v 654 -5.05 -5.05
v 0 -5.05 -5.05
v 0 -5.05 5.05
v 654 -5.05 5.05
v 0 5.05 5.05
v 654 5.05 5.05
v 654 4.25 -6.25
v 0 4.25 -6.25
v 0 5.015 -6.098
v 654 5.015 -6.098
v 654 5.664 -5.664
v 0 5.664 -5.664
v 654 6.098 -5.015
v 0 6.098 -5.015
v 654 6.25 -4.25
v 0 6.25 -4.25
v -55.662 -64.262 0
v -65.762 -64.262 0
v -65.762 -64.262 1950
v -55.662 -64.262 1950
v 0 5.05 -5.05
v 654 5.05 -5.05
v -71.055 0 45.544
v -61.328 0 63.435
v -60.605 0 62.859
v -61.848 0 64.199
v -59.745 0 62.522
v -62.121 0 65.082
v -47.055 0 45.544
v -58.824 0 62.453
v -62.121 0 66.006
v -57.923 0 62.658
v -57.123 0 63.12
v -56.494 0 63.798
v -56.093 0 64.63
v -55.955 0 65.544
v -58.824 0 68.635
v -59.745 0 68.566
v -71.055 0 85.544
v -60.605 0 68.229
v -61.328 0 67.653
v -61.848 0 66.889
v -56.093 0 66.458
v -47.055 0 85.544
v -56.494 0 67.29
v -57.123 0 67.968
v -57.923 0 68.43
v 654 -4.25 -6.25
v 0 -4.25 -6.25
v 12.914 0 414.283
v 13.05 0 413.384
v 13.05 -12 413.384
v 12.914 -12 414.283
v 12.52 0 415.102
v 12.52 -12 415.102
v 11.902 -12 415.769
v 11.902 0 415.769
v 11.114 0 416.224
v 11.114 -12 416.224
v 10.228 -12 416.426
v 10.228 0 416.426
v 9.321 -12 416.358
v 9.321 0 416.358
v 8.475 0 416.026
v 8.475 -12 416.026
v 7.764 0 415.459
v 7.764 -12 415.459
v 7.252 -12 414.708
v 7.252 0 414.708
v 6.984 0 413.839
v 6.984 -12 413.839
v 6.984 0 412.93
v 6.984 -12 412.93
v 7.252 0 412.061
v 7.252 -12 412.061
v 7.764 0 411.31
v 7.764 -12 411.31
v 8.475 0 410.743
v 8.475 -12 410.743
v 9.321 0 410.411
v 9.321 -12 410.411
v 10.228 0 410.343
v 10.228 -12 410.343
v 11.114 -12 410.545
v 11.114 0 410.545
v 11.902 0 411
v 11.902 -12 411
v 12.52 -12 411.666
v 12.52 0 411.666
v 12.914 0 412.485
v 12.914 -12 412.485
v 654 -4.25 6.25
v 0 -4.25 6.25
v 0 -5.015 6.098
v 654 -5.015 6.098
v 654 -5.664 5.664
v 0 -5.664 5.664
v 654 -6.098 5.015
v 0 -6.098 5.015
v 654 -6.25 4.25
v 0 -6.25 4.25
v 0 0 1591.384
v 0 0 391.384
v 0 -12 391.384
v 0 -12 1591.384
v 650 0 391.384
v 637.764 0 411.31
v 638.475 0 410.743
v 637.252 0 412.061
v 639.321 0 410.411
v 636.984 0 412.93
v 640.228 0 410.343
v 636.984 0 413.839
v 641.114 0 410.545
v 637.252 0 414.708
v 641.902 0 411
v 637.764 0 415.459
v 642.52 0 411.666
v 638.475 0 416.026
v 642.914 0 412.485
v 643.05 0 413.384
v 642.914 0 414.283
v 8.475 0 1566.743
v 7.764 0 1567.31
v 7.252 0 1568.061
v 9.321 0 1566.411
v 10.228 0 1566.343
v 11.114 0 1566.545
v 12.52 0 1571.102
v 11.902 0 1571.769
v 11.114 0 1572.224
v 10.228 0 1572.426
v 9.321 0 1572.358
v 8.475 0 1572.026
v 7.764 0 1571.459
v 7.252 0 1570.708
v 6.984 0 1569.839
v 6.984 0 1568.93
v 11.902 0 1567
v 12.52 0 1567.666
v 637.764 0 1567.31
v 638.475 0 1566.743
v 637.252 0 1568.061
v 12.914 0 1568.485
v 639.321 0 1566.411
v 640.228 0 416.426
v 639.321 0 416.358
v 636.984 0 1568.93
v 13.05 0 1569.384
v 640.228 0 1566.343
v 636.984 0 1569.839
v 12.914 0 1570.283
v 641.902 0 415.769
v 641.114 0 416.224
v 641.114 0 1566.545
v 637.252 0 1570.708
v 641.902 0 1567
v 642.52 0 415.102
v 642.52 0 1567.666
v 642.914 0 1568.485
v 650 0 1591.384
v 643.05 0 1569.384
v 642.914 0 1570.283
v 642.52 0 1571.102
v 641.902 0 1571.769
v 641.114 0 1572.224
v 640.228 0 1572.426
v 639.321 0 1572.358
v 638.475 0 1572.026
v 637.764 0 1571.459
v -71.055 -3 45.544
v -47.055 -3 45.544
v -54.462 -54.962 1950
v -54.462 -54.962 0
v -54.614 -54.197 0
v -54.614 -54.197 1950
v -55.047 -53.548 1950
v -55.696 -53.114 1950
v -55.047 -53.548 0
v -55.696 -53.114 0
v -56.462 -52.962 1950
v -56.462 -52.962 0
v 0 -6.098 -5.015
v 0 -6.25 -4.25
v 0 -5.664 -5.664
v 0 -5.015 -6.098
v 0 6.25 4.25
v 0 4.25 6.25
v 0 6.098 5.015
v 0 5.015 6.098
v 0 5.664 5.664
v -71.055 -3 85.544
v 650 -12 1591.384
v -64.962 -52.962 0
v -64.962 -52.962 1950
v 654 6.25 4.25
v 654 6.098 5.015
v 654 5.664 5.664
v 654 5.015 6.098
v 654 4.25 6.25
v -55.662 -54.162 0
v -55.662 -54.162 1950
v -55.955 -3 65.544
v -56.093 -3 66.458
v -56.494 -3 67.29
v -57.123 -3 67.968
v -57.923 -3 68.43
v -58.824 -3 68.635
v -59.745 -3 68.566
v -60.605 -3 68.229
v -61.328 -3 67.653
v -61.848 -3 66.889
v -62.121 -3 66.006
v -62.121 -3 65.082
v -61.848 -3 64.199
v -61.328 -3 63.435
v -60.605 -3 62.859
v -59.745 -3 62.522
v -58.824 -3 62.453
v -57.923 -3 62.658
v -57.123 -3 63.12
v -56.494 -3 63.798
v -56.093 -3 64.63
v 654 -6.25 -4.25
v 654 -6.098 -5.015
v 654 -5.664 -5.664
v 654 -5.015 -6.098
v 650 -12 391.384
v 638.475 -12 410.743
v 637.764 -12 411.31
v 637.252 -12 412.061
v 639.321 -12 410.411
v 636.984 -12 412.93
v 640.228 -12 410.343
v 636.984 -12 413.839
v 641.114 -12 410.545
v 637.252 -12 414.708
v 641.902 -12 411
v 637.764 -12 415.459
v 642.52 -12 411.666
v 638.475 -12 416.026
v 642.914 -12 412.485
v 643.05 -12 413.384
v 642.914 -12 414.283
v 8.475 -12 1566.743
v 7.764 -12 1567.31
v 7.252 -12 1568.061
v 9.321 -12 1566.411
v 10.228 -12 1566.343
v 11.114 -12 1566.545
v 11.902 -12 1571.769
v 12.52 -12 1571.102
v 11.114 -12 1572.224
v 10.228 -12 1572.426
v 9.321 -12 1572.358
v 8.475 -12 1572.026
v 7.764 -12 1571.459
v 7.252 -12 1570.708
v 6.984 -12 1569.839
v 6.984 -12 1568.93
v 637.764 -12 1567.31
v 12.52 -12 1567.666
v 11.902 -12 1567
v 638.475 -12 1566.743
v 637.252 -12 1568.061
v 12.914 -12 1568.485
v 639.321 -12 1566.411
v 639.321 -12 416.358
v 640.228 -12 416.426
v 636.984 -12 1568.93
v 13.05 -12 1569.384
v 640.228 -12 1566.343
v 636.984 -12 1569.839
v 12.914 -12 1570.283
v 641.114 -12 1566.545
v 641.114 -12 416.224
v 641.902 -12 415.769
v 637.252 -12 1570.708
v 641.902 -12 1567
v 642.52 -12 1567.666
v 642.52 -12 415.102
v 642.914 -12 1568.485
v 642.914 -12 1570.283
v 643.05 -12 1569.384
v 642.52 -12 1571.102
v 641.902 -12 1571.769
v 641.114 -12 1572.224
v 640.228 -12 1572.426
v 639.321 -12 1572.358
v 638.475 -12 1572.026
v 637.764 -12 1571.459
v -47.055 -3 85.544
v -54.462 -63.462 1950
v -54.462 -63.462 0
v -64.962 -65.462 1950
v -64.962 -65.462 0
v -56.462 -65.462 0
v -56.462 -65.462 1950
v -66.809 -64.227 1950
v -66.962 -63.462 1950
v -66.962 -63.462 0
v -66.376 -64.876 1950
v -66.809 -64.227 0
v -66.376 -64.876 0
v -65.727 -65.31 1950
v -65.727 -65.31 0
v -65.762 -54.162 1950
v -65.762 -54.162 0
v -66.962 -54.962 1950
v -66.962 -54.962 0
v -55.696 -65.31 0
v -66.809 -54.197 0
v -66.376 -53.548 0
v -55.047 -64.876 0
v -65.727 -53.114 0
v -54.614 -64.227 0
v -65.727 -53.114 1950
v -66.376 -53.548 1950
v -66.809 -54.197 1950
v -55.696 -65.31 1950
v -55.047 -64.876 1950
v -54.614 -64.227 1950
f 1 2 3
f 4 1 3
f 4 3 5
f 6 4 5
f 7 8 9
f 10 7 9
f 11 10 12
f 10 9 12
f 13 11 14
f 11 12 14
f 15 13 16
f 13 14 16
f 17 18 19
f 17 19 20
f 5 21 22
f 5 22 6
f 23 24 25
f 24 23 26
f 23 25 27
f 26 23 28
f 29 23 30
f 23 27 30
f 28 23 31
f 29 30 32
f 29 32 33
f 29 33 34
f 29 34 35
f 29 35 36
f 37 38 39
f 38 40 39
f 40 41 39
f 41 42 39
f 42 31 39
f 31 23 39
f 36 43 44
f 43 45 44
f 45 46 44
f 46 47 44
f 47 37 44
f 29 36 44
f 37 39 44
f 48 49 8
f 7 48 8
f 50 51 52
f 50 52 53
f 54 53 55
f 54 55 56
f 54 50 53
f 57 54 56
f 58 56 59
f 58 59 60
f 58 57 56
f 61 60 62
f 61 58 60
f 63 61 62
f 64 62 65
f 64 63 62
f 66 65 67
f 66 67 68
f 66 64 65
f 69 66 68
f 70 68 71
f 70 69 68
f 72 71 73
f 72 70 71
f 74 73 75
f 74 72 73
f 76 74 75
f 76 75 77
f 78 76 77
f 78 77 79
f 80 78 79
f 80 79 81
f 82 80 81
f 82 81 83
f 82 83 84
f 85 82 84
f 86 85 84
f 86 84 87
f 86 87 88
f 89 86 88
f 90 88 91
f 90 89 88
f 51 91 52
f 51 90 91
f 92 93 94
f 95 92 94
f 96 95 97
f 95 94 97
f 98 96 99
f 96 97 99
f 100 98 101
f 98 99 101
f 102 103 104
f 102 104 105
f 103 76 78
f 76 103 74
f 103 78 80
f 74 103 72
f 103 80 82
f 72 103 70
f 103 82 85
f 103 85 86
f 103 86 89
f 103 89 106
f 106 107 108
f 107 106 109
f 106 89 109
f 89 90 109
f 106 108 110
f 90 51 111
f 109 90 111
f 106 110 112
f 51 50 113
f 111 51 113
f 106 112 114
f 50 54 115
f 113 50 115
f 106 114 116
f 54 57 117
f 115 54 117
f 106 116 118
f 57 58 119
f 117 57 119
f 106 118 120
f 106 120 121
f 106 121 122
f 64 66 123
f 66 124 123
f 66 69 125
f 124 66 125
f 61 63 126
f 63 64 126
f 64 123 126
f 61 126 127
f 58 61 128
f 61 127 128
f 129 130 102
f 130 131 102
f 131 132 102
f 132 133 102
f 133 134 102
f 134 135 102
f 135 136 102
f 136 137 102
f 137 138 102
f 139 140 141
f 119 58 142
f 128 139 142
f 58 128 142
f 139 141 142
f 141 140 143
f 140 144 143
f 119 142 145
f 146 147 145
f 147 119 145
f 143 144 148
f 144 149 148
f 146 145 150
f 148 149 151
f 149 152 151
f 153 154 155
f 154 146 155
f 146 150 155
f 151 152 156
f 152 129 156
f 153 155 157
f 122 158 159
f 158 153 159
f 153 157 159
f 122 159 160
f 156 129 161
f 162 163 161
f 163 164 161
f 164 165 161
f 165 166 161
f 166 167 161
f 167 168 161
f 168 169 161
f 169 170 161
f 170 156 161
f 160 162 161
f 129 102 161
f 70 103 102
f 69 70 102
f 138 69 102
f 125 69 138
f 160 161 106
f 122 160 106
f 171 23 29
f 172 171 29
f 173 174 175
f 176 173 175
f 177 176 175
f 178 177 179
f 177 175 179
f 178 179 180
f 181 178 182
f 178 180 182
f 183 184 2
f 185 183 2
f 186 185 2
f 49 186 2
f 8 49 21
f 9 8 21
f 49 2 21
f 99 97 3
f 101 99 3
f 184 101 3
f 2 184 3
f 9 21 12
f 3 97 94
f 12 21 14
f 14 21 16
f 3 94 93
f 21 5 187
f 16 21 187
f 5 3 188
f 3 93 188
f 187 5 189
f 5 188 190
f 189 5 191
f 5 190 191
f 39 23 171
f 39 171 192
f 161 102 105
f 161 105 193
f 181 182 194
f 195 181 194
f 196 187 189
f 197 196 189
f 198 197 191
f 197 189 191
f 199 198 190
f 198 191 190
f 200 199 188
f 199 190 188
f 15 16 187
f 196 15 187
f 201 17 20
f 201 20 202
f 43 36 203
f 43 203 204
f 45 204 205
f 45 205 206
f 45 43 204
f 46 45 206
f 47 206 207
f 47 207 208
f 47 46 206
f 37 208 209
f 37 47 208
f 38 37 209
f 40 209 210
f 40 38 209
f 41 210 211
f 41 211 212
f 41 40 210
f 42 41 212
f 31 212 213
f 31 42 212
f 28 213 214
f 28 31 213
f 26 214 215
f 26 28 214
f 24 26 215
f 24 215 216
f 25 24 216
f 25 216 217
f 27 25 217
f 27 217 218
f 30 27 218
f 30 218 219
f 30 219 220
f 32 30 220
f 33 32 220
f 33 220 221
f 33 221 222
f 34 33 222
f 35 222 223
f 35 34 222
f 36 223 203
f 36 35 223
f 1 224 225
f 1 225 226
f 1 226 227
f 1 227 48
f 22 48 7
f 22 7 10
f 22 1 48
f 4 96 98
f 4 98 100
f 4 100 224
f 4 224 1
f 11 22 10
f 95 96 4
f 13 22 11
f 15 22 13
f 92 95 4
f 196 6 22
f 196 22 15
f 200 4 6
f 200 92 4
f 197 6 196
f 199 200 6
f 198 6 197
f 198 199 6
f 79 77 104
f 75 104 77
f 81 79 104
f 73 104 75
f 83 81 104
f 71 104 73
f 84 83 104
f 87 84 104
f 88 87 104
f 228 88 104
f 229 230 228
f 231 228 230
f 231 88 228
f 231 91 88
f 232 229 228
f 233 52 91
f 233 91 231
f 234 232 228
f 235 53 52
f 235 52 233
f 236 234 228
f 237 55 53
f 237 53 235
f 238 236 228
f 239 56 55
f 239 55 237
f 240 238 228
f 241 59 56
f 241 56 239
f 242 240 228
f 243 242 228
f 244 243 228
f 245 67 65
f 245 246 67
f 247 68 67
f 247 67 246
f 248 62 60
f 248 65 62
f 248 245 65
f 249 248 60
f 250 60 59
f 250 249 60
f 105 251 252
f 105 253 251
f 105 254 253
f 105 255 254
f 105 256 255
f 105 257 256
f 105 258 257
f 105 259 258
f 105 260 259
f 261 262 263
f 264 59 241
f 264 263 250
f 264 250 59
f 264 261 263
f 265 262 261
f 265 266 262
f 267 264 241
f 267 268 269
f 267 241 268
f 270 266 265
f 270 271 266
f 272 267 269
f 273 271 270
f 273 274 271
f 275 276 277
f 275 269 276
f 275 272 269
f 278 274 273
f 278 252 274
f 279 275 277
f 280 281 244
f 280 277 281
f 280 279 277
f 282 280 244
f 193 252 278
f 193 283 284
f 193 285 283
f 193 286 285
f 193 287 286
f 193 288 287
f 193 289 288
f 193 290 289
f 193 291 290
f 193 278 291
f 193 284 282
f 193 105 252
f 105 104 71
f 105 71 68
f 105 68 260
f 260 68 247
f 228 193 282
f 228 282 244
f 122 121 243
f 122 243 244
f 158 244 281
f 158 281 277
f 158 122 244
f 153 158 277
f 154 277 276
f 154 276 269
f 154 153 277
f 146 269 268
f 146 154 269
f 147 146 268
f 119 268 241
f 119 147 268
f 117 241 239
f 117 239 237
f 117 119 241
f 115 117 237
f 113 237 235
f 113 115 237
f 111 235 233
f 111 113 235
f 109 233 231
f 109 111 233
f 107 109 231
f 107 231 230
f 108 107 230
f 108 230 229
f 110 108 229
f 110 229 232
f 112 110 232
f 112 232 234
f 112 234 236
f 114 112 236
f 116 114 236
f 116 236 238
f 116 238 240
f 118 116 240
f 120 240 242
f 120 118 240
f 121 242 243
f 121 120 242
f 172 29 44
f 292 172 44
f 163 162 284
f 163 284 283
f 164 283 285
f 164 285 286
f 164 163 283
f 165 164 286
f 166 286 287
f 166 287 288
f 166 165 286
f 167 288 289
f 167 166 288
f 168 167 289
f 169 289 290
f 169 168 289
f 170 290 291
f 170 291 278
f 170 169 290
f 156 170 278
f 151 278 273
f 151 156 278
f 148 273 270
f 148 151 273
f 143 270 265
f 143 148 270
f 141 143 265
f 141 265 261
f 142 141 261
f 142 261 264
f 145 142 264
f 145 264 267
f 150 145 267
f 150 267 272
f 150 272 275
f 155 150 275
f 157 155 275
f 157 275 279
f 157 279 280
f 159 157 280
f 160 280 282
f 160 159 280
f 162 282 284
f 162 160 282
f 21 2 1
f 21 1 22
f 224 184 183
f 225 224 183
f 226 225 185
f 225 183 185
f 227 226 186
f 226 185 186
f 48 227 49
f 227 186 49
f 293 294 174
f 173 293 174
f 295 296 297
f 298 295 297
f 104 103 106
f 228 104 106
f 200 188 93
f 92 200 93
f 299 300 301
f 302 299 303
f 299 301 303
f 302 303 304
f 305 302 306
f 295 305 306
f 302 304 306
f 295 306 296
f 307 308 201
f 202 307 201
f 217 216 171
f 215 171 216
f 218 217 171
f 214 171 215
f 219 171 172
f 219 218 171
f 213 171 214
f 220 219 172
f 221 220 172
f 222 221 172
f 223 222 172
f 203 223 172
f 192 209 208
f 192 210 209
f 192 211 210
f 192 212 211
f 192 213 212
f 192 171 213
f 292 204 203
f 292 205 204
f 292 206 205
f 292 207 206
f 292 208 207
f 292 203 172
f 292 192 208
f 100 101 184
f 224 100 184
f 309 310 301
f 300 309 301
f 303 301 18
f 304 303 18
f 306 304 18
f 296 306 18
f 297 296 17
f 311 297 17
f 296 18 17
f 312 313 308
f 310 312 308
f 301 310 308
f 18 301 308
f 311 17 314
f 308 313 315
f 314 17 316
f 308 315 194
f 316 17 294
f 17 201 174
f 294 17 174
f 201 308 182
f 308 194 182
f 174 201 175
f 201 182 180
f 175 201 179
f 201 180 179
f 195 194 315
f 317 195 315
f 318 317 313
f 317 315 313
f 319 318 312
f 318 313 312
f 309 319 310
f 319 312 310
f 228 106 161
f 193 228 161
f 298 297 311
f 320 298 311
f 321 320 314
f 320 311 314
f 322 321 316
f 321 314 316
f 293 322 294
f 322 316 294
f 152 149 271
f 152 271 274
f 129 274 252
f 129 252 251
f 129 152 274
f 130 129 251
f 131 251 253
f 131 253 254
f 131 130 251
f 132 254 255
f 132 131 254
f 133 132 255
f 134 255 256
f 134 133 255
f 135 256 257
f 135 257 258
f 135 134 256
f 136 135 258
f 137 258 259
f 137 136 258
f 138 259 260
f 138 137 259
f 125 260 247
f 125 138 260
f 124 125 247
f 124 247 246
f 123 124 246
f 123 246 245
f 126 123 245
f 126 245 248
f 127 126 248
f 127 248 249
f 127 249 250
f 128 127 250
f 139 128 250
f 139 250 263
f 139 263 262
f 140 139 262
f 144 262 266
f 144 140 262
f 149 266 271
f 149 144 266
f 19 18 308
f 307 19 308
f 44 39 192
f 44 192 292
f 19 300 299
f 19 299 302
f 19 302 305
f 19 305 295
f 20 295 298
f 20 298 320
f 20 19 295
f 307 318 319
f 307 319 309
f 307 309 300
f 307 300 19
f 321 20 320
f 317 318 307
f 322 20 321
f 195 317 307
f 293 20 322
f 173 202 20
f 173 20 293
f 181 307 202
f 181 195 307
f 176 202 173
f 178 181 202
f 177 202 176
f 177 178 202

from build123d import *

# Parameters (mm, degrees)
F0_W     = 10.1
F0_H     = 10.1
F1_DEPTH = 1950
F2_W     = 10.1
F2_H     = 10.1
F3_DEPTH = 654
F4_W     = 24
F4_H     = 40
F4_R     = 3.1
F5_DEPTH = 3
F6_W     = 650
F6_H     = 1200
F6_R     = 3.05
F7_DEPTH = 12


with BuildPart() as f1:
    # F0 (on Top) → F1 (new body)
    with BuildSketch(Plane.XY):
        with BuildLine():
            Line((-56.461647, -52.961955), (-64.961647, -52.961955))
            ThreePointArc((-64.961647, -52.961955), (-66.37586, -53.547741), (-66.961647, -54.961955))
            Line((-66.961647, -54.961955), (-66.961647, -63.461955))
            ThreePointArc((-66.961647, -63.461955), (-66.37586, -64.876168), (-64.961647, -65.461955))
            Line((-64.961647, -65.461955), (-56.461647, -65.461955))
            ThreePointArc((-56.461647, -65.461955), (-55.047433, -64.876168), (-54.461647, -63.461955))
            Line((-54.461647, -63.461955), (-54.461647, -54.961955))
            ThreePointArc((-54.461647, -54.961955), (-55.047433, -53.547741), (-56.461647, -52.961955))
        make_face()
        with Locations((-60.711647, -59.211955)):
            Rectangle(F0_W, F0_H, mode=Mode.SUBTRACT)
    extrude(amount=F1_DEPTH)


with BuildPart() as f3:
    # F2 (on Right) → F3 (new body)
    with BuildSketch(Plane.YZ):
        with BuildLine():
            Line((4.25, 6.25), (-4.25, 6.25))
            ThreePointArc((-4.25, 6.25), (-5.664214, 5.664214), (-6.25, 4.25))
            Line((-6.25, 4.25), (-6.25, -4.25))
            ThreePointArc((-6.25, -4.25), (-5.664214, -5.664214), (-4.25, -6.25))
            Line((-4.25, -6.25), (4.25, -6.25))
            ThreePointArc((4.25, -6.25), (5.664214, -5.664214), (6.25, -4.25))
            Line((6.25, -4.25), (6.25, 4.25))
            ThreePointArc((6.25, 4.25), (5.664214, 5.664214), (4.25, 6.25))
        make_face()
        Rectangle(F2_W, F2_H, mode=Mode.SUBTRACT)
    extrude(amount=F3_DEPTH)


with BuildPart() as f5:
    # F4 (on Front) → F5 (new body)
    with BuildSketch(Plane.XZ):
        with Locations((-59.05548, 65.544006)):
            Rectangle(F4_W, F4_H)
        with Locations((-59.05548, 65.544006)):
            Circle(F4_R, mode=Mode.SUBTRACT)
    extrude(amount=F5_DEPTH)


with BuildPart() as f7:
    # F6 (on Front) → F7 (new body)
    with BuildSketch(Plane.XZ):
        with Locations((325, 991.384363)):
            Rectangle(F6_W, F6_H)
        with Locations((10, 413.384363)):
            Circle(F6_R, mode=Mode.SUBTRACT)
        with Locations((640, 413.384363)):
            Circle(F6_R, mode=Mode.SUBTRACT)
        with Locations((10, 1569.384363)):
            Circle(F6_R, mode=Mode.SUBTRACT)
        with Locations((640, 1569.384363)):
            Circle(F6_R, mode=Mode.SUBTRACT)
    extrude(amount=F7_DEPTH)


solid = Compound([f1.part, f3.part, f5.part, f7.part])
